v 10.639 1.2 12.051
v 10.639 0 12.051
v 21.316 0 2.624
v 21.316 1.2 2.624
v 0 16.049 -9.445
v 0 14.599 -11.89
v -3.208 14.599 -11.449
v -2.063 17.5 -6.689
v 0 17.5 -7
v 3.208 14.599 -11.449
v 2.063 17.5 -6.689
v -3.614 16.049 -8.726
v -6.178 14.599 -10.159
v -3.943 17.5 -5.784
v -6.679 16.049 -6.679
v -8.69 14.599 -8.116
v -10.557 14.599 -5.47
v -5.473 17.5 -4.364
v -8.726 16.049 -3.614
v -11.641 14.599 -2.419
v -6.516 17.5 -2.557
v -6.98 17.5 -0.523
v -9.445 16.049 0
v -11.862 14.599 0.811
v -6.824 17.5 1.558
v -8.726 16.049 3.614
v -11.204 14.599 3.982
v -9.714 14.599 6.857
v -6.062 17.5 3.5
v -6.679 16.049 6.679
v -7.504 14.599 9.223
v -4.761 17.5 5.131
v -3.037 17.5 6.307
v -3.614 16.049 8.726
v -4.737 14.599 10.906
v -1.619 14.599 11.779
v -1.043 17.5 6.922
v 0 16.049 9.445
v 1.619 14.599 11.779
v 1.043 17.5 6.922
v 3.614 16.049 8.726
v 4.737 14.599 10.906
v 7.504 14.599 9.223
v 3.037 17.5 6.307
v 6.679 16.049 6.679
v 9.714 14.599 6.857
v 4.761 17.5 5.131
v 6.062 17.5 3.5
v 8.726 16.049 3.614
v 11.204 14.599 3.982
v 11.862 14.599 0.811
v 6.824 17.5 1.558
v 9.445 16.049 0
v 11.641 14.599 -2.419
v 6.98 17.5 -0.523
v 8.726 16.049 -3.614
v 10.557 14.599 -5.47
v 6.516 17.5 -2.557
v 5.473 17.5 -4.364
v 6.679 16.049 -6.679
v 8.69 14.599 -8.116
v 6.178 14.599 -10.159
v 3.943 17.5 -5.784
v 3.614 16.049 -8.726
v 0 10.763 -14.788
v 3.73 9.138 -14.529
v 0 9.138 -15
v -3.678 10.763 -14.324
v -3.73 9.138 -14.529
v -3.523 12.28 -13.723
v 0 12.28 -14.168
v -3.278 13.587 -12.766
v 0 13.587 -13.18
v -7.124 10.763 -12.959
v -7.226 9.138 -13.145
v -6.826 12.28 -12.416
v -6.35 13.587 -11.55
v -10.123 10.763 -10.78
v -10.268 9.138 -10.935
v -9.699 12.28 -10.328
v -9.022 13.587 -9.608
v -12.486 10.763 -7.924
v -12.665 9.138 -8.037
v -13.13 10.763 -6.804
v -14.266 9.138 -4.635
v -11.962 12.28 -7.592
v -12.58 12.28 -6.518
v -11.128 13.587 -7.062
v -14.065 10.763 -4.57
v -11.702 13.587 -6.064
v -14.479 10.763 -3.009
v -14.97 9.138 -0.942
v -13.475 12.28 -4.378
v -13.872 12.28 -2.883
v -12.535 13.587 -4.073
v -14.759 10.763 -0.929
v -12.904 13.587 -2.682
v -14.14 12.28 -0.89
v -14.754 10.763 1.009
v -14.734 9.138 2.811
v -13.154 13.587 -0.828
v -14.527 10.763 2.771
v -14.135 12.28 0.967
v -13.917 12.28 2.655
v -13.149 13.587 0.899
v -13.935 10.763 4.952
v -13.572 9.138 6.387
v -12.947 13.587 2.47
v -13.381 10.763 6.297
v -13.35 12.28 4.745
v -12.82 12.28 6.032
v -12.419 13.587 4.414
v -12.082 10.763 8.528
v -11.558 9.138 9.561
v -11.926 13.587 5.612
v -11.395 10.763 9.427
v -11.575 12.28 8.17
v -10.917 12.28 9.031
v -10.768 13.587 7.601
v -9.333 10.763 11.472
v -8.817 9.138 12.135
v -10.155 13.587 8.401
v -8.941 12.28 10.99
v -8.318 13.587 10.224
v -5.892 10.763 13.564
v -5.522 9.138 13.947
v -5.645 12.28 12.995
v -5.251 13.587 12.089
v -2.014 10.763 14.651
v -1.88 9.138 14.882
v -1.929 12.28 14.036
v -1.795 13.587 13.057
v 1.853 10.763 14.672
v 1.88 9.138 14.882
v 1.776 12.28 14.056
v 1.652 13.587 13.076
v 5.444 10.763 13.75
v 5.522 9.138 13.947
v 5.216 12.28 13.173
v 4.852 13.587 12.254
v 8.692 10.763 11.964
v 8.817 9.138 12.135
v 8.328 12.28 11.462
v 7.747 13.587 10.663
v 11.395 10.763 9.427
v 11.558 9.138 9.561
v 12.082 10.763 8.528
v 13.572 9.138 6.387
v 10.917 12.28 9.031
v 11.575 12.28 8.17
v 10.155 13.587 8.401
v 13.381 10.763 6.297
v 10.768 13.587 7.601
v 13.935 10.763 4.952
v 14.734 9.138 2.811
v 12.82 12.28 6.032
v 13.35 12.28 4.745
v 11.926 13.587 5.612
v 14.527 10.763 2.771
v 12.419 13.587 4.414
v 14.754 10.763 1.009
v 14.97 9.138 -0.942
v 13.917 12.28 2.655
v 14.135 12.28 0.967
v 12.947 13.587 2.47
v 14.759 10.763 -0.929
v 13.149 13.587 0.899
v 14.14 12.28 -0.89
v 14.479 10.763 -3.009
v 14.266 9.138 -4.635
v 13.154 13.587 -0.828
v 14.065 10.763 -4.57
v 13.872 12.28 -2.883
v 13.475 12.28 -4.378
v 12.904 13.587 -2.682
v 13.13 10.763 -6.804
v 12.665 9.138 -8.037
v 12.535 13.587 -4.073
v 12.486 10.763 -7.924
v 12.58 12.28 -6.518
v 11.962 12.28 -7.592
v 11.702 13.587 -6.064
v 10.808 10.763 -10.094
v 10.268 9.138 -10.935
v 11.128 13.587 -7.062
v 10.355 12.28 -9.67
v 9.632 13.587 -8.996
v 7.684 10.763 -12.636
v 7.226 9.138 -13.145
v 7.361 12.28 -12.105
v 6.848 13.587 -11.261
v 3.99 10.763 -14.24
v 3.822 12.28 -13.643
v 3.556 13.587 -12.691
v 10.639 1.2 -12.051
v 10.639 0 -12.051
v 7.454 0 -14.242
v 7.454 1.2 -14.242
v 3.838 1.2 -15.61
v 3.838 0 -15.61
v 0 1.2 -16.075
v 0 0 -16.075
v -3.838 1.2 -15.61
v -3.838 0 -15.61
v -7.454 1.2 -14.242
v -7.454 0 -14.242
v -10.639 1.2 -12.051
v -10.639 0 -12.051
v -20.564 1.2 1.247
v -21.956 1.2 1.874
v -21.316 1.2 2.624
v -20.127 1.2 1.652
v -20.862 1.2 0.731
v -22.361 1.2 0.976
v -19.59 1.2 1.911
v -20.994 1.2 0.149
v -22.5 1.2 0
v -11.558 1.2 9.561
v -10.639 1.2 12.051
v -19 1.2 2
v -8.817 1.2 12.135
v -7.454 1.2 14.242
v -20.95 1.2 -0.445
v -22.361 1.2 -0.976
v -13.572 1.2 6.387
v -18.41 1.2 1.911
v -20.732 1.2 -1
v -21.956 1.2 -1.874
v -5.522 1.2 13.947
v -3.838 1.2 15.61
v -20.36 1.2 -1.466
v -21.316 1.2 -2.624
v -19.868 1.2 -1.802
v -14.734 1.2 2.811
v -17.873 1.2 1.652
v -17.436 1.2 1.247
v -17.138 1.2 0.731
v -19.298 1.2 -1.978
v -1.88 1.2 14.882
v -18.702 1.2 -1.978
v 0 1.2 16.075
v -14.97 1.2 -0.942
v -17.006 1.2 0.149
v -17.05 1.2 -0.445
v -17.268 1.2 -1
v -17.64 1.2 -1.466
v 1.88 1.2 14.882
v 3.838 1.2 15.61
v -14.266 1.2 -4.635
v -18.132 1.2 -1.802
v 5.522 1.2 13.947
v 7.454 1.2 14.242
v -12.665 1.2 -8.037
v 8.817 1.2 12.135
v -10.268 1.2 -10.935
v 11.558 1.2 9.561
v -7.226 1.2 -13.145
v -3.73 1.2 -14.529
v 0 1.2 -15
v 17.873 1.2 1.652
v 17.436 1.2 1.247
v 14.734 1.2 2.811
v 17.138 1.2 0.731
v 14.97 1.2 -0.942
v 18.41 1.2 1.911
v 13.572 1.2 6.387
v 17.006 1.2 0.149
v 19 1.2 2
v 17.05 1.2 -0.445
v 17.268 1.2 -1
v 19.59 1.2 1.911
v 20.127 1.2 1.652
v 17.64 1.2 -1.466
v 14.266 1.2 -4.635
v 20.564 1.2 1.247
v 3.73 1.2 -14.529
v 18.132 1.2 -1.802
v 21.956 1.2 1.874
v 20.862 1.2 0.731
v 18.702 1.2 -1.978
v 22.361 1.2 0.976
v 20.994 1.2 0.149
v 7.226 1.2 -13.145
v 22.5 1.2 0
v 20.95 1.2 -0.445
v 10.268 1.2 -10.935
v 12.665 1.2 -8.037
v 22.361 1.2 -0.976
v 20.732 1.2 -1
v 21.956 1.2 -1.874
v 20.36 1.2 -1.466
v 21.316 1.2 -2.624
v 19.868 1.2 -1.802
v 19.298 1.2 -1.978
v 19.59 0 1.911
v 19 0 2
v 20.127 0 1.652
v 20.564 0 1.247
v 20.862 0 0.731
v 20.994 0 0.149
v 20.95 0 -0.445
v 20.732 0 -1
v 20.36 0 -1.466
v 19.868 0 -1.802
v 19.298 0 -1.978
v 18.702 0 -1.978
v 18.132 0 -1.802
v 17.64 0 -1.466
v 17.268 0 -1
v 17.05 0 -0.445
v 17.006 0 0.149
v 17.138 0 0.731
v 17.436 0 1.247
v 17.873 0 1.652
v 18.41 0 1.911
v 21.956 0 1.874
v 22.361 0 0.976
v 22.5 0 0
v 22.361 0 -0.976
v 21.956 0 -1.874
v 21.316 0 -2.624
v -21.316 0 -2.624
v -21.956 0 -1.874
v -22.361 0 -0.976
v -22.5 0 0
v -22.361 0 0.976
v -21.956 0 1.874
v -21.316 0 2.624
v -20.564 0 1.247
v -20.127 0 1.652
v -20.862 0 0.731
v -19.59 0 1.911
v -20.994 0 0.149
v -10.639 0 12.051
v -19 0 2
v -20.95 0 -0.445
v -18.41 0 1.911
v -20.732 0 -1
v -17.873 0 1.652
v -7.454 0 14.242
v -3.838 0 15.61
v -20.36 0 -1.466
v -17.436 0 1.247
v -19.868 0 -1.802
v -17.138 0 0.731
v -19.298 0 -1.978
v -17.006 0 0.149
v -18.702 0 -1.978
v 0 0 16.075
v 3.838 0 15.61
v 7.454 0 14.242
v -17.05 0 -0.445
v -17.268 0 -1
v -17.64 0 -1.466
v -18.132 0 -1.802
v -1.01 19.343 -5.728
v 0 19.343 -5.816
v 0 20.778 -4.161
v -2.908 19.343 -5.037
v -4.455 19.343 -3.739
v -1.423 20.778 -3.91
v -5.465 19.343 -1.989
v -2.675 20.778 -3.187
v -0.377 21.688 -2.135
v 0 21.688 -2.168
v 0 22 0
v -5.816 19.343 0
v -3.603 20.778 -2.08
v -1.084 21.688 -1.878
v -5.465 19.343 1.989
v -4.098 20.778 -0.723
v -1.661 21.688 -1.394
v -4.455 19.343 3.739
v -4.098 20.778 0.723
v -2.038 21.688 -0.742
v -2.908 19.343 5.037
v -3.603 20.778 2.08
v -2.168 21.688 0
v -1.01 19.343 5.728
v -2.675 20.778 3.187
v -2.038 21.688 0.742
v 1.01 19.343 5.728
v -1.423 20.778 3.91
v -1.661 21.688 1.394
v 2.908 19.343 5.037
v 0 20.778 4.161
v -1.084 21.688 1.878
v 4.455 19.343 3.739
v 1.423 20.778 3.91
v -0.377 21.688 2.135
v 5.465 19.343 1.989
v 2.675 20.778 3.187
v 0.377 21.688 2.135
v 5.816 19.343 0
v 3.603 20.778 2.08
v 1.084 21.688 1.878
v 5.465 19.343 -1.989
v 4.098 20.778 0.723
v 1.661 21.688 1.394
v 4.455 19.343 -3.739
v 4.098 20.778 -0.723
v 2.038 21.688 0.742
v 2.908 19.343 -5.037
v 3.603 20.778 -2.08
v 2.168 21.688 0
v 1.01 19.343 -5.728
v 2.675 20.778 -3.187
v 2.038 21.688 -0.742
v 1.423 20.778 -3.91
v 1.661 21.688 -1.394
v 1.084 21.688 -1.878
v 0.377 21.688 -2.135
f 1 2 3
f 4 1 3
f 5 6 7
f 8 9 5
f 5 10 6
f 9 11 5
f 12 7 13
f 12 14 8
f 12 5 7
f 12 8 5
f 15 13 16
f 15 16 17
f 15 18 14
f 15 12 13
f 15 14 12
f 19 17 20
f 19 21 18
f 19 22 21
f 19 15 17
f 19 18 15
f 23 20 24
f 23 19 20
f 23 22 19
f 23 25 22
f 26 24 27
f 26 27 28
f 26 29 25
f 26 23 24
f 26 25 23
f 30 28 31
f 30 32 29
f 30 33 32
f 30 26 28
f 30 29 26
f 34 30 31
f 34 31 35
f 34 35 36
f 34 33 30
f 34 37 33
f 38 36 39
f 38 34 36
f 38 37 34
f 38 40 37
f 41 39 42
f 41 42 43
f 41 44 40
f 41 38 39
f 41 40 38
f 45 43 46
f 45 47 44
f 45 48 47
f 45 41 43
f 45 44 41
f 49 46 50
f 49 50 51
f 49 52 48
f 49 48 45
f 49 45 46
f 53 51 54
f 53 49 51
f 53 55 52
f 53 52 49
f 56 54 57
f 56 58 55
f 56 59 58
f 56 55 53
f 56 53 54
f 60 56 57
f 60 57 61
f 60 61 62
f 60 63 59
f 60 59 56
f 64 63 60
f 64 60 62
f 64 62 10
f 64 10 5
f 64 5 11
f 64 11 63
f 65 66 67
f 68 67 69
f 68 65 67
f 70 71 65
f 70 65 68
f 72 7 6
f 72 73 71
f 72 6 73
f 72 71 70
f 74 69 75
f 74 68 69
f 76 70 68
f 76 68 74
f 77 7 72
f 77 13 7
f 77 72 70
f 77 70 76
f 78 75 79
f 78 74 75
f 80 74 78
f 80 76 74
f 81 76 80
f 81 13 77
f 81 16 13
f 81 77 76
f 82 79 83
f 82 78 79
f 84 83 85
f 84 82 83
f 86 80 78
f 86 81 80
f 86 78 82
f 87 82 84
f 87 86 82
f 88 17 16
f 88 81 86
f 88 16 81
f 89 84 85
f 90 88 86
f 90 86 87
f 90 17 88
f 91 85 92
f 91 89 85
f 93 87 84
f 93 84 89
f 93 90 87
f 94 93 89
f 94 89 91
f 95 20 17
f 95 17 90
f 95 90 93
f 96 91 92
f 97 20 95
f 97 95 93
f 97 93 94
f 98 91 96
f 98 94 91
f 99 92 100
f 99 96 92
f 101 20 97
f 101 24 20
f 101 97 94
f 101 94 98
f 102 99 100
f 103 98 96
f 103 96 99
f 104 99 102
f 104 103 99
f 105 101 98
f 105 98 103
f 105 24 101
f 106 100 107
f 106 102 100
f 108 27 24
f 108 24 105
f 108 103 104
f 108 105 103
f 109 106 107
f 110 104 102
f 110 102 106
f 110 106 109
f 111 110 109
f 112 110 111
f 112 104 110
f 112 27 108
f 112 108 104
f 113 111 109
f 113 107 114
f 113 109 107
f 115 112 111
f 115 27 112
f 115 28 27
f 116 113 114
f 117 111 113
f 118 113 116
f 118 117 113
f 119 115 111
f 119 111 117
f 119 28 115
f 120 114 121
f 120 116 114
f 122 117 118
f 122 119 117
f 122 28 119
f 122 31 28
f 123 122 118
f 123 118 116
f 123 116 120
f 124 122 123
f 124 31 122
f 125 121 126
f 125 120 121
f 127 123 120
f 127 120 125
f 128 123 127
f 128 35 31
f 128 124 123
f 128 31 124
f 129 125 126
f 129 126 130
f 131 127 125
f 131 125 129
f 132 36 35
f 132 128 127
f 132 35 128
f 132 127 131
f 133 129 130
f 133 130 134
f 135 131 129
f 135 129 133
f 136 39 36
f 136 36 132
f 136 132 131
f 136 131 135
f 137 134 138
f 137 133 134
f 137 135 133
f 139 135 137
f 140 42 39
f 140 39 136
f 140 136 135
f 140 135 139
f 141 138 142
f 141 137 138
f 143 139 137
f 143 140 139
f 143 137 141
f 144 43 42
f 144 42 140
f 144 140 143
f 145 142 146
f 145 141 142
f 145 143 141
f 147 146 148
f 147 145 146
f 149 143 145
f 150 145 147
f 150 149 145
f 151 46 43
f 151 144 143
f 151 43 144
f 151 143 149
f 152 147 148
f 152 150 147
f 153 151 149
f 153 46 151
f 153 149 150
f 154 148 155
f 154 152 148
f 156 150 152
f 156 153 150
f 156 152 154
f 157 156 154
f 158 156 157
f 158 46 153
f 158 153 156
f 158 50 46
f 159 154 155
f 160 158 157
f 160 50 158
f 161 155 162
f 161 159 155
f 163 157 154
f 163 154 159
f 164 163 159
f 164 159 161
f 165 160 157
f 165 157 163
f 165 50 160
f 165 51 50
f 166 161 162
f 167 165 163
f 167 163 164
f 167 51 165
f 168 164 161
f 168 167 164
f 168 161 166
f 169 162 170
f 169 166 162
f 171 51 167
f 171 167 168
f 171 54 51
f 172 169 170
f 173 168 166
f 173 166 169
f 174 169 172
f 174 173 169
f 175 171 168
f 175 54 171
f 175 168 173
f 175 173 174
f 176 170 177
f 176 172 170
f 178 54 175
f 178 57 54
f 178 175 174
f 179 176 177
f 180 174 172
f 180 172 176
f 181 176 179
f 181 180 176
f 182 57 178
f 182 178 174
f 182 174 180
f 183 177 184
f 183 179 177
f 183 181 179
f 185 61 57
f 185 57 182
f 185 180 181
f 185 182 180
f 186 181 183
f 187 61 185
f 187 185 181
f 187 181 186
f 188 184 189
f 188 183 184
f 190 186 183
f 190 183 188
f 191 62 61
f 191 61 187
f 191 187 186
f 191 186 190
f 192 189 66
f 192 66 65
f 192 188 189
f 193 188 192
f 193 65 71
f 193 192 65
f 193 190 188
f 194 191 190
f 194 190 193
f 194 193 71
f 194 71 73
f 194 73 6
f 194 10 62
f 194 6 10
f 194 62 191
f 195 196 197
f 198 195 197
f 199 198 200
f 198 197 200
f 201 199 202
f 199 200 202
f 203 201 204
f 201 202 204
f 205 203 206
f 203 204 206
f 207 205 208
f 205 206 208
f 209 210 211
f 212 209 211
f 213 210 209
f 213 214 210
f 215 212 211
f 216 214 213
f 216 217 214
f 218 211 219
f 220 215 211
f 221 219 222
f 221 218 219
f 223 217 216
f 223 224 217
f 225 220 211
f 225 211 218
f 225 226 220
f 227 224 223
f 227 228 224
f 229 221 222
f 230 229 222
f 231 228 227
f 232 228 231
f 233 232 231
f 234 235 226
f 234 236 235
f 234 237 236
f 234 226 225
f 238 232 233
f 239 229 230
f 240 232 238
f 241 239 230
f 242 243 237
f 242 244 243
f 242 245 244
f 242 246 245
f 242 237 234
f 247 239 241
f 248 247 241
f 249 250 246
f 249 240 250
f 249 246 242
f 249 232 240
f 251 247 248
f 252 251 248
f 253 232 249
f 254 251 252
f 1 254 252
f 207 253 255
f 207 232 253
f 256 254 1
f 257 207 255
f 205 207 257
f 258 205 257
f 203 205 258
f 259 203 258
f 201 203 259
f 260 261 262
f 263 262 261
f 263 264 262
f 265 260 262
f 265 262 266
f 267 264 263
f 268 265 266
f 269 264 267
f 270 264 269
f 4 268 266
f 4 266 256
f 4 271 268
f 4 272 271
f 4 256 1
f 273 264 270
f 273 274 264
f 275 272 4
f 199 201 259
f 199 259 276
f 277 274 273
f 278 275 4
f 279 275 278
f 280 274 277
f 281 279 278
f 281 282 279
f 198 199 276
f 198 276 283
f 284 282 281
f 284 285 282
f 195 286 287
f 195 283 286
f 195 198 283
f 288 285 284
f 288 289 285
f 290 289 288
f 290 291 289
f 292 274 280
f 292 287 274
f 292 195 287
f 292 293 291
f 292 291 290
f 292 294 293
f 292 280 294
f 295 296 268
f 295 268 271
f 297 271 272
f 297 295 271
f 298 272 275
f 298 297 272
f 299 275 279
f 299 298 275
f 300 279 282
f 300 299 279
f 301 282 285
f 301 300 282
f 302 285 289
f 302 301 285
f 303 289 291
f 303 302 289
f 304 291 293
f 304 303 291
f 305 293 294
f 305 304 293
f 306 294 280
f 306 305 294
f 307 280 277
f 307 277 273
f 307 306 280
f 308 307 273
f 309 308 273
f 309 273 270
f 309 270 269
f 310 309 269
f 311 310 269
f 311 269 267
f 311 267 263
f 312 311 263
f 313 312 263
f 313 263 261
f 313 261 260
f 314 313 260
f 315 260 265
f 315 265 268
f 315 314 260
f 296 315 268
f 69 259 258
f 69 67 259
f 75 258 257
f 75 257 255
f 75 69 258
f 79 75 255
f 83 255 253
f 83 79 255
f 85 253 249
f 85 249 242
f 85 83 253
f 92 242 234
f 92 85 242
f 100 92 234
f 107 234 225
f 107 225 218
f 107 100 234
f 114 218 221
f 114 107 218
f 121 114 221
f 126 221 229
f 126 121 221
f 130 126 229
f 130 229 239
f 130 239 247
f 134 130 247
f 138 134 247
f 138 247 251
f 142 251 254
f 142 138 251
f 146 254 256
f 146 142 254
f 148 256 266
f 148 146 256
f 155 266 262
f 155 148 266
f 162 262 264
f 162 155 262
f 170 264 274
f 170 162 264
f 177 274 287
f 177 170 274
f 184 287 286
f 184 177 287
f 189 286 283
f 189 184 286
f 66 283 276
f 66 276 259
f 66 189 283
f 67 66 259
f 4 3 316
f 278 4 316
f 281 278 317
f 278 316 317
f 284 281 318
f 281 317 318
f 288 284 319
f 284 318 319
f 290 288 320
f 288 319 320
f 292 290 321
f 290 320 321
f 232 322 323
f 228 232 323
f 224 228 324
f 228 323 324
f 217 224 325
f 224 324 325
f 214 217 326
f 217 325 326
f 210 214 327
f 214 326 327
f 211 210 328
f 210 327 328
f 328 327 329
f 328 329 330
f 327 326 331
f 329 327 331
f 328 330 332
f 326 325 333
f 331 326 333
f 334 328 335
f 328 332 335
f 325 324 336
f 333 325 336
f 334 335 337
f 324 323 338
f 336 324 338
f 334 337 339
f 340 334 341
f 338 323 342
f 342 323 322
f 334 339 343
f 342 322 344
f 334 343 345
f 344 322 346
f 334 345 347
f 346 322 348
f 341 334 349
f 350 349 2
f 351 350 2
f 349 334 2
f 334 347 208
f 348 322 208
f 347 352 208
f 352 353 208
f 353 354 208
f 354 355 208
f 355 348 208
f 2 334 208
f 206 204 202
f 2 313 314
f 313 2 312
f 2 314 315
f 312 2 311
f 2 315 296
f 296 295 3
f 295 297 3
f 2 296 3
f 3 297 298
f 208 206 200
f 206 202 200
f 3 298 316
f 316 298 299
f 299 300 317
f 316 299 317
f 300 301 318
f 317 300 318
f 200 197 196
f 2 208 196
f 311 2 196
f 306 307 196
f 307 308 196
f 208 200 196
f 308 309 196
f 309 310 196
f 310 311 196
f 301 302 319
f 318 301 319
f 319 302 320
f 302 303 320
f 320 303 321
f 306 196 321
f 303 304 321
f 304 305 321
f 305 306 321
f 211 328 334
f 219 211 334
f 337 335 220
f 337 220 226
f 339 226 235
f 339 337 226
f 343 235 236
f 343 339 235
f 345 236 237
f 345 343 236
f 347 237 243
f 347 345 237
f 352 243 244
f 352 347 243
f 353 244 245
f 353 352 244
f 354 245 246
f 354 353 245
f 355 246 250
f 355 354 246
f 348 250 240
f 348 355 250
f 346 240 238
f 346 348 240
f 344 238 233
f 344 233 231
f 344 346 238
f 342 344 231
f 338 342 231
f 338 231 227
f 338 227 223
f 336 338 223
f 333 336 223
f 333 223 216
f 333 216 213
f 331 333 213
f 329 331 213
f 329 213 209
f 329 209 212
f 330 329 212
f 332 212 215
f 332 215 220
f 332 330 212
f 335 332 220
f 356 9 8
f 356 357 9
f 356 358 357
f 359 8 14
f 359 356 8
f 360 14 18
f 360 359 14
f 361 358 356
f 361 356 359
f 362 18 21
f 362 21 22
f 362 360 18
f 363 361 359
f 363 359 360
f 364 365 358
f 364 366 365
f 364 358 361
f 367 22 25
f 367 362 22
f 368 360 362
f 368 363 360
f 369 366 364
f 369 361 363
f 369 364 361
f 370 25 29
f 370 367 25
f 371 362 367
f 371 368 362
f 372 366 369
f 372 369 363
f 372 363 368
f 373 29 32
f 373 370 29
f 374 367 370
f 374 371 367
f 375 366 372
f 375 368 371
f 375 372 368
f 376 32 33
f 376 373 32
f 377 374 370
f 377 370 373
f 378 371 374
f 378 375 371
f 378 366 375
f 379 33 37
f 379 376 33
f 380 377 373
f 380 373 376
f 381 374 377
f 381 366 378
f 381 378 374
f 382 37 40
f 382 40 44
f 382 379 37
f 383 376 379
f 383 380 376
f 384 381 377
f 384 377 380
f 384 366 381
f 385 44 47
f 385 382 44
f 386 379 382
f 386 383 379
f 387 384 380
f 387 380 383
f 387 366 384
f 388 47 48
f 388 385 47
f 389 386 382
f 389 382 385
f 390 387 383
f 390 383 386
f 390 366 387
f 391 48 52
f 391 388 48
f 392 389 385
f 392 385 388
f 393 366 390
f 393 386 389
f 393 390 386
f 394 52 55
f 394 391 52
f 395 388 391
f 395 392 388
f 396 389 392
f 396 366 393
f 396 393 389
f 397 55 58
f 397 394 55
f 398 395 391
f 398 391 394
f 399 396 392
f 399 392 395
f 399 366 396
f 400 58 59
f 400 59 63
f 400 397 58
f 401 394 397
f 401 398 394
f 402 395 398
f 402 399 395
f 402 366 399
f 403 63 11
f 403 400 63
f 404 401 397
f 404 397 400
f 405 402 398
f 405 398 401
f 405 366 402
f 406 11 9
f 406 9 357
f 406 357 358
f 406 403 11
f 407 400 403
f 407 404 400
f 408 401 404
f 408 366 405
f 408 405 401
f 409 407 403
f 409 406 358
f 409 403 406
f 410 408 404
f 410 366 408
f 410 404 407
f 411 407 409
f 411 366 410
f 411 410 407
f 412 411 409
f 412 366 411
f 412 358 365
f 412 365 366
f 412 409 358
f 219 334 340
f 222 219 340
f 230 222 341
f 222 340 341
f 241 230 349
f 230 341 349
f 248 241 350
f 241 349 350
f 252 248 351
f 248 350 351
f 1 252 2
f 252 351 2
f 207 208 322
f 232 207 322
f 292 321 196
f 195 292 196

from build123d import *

# Parameters (mm, degrees)
SKETCH1_R           = 2
BOSS_EXTRUDE1_DEPTH = 1.2


with BuildPart() as part:
    # Sketch1 → Boss-Extrude1 (new body)
    with BuildSketch(Plane(origin=(0, 0, 0), x_dir=(1, 0, 0), z_dir=(0, 1, 0))):
        with BuildLine():
            ThreePointArc((-10.639111842, -12.050515516), (0, -16.075), (10.639111842, -12.050515516))
            Line((10.639111842, -12.050515516), (21.316447368, -2.623751434))
            ThreePointArc((21.316447368, -2.623751434), (22.5, 0), (21.316447368, 2.623751434))
            Line((21.316447368, 2.623751434), (10.639111842, 12.050515516))
            ThreePointArc((10.639111842, 12.050515516), (0, 16.075), (-10.639111842, 12.050515516))
            Line((-10.639111842, 12.050515516), (-21.316447368, 2.623751434))
            ThreePointArc((-21.316447368, 2.623751434), (-22.5, 0), (-21.316447368, -2.623751434))
            Line((-21.316447368, -2.623751434), (-10.639111842, -12.050515516))
        make_face()
        with Locations(Location((-19, 0, 0), (0, 0, 270))):
            Circle(SKETCH1_R, mode=Mode.SUBTRACT)
        with Locations(Location((19, 0, 0), (0, 0, 270))):
            Circle(SKETCH1_R, mode=Mode.SUBTRACT)
    extrude(amount=BOSS_EXTRUDE1_DEPTH)

    # Sketch3 → Revolve1 (revolve)
    with BuildSketch(Plane.XY, mode=Mode.PRIVATE) as revolve1_sk:
        with BuildLine():
            Line((-15, 1.2), (-15, 9.1375))
            ThreePointArc((-15, 9.1375), (-14.168033936, 12.279760569), (-11.890141265, 14.598634001))
            Line((-11.890141265, 14.598634001), (-7, 17.5))
            ThreePointArc((-7, 17.5), (-4.160829244, 20.777956602), (0, 22))
            Line((0, 22), (0, 1.2))
            Line((0, 1.2), (-15, 1.2))
        make_face()
    revolve(revolve1_sk.sketch.rotate(Axis((0, 1.2, 0), (0, 1, 0)), 270), axis=Axis((0, 1.2, 0), (0, 1, 0)))


solid = part.part
